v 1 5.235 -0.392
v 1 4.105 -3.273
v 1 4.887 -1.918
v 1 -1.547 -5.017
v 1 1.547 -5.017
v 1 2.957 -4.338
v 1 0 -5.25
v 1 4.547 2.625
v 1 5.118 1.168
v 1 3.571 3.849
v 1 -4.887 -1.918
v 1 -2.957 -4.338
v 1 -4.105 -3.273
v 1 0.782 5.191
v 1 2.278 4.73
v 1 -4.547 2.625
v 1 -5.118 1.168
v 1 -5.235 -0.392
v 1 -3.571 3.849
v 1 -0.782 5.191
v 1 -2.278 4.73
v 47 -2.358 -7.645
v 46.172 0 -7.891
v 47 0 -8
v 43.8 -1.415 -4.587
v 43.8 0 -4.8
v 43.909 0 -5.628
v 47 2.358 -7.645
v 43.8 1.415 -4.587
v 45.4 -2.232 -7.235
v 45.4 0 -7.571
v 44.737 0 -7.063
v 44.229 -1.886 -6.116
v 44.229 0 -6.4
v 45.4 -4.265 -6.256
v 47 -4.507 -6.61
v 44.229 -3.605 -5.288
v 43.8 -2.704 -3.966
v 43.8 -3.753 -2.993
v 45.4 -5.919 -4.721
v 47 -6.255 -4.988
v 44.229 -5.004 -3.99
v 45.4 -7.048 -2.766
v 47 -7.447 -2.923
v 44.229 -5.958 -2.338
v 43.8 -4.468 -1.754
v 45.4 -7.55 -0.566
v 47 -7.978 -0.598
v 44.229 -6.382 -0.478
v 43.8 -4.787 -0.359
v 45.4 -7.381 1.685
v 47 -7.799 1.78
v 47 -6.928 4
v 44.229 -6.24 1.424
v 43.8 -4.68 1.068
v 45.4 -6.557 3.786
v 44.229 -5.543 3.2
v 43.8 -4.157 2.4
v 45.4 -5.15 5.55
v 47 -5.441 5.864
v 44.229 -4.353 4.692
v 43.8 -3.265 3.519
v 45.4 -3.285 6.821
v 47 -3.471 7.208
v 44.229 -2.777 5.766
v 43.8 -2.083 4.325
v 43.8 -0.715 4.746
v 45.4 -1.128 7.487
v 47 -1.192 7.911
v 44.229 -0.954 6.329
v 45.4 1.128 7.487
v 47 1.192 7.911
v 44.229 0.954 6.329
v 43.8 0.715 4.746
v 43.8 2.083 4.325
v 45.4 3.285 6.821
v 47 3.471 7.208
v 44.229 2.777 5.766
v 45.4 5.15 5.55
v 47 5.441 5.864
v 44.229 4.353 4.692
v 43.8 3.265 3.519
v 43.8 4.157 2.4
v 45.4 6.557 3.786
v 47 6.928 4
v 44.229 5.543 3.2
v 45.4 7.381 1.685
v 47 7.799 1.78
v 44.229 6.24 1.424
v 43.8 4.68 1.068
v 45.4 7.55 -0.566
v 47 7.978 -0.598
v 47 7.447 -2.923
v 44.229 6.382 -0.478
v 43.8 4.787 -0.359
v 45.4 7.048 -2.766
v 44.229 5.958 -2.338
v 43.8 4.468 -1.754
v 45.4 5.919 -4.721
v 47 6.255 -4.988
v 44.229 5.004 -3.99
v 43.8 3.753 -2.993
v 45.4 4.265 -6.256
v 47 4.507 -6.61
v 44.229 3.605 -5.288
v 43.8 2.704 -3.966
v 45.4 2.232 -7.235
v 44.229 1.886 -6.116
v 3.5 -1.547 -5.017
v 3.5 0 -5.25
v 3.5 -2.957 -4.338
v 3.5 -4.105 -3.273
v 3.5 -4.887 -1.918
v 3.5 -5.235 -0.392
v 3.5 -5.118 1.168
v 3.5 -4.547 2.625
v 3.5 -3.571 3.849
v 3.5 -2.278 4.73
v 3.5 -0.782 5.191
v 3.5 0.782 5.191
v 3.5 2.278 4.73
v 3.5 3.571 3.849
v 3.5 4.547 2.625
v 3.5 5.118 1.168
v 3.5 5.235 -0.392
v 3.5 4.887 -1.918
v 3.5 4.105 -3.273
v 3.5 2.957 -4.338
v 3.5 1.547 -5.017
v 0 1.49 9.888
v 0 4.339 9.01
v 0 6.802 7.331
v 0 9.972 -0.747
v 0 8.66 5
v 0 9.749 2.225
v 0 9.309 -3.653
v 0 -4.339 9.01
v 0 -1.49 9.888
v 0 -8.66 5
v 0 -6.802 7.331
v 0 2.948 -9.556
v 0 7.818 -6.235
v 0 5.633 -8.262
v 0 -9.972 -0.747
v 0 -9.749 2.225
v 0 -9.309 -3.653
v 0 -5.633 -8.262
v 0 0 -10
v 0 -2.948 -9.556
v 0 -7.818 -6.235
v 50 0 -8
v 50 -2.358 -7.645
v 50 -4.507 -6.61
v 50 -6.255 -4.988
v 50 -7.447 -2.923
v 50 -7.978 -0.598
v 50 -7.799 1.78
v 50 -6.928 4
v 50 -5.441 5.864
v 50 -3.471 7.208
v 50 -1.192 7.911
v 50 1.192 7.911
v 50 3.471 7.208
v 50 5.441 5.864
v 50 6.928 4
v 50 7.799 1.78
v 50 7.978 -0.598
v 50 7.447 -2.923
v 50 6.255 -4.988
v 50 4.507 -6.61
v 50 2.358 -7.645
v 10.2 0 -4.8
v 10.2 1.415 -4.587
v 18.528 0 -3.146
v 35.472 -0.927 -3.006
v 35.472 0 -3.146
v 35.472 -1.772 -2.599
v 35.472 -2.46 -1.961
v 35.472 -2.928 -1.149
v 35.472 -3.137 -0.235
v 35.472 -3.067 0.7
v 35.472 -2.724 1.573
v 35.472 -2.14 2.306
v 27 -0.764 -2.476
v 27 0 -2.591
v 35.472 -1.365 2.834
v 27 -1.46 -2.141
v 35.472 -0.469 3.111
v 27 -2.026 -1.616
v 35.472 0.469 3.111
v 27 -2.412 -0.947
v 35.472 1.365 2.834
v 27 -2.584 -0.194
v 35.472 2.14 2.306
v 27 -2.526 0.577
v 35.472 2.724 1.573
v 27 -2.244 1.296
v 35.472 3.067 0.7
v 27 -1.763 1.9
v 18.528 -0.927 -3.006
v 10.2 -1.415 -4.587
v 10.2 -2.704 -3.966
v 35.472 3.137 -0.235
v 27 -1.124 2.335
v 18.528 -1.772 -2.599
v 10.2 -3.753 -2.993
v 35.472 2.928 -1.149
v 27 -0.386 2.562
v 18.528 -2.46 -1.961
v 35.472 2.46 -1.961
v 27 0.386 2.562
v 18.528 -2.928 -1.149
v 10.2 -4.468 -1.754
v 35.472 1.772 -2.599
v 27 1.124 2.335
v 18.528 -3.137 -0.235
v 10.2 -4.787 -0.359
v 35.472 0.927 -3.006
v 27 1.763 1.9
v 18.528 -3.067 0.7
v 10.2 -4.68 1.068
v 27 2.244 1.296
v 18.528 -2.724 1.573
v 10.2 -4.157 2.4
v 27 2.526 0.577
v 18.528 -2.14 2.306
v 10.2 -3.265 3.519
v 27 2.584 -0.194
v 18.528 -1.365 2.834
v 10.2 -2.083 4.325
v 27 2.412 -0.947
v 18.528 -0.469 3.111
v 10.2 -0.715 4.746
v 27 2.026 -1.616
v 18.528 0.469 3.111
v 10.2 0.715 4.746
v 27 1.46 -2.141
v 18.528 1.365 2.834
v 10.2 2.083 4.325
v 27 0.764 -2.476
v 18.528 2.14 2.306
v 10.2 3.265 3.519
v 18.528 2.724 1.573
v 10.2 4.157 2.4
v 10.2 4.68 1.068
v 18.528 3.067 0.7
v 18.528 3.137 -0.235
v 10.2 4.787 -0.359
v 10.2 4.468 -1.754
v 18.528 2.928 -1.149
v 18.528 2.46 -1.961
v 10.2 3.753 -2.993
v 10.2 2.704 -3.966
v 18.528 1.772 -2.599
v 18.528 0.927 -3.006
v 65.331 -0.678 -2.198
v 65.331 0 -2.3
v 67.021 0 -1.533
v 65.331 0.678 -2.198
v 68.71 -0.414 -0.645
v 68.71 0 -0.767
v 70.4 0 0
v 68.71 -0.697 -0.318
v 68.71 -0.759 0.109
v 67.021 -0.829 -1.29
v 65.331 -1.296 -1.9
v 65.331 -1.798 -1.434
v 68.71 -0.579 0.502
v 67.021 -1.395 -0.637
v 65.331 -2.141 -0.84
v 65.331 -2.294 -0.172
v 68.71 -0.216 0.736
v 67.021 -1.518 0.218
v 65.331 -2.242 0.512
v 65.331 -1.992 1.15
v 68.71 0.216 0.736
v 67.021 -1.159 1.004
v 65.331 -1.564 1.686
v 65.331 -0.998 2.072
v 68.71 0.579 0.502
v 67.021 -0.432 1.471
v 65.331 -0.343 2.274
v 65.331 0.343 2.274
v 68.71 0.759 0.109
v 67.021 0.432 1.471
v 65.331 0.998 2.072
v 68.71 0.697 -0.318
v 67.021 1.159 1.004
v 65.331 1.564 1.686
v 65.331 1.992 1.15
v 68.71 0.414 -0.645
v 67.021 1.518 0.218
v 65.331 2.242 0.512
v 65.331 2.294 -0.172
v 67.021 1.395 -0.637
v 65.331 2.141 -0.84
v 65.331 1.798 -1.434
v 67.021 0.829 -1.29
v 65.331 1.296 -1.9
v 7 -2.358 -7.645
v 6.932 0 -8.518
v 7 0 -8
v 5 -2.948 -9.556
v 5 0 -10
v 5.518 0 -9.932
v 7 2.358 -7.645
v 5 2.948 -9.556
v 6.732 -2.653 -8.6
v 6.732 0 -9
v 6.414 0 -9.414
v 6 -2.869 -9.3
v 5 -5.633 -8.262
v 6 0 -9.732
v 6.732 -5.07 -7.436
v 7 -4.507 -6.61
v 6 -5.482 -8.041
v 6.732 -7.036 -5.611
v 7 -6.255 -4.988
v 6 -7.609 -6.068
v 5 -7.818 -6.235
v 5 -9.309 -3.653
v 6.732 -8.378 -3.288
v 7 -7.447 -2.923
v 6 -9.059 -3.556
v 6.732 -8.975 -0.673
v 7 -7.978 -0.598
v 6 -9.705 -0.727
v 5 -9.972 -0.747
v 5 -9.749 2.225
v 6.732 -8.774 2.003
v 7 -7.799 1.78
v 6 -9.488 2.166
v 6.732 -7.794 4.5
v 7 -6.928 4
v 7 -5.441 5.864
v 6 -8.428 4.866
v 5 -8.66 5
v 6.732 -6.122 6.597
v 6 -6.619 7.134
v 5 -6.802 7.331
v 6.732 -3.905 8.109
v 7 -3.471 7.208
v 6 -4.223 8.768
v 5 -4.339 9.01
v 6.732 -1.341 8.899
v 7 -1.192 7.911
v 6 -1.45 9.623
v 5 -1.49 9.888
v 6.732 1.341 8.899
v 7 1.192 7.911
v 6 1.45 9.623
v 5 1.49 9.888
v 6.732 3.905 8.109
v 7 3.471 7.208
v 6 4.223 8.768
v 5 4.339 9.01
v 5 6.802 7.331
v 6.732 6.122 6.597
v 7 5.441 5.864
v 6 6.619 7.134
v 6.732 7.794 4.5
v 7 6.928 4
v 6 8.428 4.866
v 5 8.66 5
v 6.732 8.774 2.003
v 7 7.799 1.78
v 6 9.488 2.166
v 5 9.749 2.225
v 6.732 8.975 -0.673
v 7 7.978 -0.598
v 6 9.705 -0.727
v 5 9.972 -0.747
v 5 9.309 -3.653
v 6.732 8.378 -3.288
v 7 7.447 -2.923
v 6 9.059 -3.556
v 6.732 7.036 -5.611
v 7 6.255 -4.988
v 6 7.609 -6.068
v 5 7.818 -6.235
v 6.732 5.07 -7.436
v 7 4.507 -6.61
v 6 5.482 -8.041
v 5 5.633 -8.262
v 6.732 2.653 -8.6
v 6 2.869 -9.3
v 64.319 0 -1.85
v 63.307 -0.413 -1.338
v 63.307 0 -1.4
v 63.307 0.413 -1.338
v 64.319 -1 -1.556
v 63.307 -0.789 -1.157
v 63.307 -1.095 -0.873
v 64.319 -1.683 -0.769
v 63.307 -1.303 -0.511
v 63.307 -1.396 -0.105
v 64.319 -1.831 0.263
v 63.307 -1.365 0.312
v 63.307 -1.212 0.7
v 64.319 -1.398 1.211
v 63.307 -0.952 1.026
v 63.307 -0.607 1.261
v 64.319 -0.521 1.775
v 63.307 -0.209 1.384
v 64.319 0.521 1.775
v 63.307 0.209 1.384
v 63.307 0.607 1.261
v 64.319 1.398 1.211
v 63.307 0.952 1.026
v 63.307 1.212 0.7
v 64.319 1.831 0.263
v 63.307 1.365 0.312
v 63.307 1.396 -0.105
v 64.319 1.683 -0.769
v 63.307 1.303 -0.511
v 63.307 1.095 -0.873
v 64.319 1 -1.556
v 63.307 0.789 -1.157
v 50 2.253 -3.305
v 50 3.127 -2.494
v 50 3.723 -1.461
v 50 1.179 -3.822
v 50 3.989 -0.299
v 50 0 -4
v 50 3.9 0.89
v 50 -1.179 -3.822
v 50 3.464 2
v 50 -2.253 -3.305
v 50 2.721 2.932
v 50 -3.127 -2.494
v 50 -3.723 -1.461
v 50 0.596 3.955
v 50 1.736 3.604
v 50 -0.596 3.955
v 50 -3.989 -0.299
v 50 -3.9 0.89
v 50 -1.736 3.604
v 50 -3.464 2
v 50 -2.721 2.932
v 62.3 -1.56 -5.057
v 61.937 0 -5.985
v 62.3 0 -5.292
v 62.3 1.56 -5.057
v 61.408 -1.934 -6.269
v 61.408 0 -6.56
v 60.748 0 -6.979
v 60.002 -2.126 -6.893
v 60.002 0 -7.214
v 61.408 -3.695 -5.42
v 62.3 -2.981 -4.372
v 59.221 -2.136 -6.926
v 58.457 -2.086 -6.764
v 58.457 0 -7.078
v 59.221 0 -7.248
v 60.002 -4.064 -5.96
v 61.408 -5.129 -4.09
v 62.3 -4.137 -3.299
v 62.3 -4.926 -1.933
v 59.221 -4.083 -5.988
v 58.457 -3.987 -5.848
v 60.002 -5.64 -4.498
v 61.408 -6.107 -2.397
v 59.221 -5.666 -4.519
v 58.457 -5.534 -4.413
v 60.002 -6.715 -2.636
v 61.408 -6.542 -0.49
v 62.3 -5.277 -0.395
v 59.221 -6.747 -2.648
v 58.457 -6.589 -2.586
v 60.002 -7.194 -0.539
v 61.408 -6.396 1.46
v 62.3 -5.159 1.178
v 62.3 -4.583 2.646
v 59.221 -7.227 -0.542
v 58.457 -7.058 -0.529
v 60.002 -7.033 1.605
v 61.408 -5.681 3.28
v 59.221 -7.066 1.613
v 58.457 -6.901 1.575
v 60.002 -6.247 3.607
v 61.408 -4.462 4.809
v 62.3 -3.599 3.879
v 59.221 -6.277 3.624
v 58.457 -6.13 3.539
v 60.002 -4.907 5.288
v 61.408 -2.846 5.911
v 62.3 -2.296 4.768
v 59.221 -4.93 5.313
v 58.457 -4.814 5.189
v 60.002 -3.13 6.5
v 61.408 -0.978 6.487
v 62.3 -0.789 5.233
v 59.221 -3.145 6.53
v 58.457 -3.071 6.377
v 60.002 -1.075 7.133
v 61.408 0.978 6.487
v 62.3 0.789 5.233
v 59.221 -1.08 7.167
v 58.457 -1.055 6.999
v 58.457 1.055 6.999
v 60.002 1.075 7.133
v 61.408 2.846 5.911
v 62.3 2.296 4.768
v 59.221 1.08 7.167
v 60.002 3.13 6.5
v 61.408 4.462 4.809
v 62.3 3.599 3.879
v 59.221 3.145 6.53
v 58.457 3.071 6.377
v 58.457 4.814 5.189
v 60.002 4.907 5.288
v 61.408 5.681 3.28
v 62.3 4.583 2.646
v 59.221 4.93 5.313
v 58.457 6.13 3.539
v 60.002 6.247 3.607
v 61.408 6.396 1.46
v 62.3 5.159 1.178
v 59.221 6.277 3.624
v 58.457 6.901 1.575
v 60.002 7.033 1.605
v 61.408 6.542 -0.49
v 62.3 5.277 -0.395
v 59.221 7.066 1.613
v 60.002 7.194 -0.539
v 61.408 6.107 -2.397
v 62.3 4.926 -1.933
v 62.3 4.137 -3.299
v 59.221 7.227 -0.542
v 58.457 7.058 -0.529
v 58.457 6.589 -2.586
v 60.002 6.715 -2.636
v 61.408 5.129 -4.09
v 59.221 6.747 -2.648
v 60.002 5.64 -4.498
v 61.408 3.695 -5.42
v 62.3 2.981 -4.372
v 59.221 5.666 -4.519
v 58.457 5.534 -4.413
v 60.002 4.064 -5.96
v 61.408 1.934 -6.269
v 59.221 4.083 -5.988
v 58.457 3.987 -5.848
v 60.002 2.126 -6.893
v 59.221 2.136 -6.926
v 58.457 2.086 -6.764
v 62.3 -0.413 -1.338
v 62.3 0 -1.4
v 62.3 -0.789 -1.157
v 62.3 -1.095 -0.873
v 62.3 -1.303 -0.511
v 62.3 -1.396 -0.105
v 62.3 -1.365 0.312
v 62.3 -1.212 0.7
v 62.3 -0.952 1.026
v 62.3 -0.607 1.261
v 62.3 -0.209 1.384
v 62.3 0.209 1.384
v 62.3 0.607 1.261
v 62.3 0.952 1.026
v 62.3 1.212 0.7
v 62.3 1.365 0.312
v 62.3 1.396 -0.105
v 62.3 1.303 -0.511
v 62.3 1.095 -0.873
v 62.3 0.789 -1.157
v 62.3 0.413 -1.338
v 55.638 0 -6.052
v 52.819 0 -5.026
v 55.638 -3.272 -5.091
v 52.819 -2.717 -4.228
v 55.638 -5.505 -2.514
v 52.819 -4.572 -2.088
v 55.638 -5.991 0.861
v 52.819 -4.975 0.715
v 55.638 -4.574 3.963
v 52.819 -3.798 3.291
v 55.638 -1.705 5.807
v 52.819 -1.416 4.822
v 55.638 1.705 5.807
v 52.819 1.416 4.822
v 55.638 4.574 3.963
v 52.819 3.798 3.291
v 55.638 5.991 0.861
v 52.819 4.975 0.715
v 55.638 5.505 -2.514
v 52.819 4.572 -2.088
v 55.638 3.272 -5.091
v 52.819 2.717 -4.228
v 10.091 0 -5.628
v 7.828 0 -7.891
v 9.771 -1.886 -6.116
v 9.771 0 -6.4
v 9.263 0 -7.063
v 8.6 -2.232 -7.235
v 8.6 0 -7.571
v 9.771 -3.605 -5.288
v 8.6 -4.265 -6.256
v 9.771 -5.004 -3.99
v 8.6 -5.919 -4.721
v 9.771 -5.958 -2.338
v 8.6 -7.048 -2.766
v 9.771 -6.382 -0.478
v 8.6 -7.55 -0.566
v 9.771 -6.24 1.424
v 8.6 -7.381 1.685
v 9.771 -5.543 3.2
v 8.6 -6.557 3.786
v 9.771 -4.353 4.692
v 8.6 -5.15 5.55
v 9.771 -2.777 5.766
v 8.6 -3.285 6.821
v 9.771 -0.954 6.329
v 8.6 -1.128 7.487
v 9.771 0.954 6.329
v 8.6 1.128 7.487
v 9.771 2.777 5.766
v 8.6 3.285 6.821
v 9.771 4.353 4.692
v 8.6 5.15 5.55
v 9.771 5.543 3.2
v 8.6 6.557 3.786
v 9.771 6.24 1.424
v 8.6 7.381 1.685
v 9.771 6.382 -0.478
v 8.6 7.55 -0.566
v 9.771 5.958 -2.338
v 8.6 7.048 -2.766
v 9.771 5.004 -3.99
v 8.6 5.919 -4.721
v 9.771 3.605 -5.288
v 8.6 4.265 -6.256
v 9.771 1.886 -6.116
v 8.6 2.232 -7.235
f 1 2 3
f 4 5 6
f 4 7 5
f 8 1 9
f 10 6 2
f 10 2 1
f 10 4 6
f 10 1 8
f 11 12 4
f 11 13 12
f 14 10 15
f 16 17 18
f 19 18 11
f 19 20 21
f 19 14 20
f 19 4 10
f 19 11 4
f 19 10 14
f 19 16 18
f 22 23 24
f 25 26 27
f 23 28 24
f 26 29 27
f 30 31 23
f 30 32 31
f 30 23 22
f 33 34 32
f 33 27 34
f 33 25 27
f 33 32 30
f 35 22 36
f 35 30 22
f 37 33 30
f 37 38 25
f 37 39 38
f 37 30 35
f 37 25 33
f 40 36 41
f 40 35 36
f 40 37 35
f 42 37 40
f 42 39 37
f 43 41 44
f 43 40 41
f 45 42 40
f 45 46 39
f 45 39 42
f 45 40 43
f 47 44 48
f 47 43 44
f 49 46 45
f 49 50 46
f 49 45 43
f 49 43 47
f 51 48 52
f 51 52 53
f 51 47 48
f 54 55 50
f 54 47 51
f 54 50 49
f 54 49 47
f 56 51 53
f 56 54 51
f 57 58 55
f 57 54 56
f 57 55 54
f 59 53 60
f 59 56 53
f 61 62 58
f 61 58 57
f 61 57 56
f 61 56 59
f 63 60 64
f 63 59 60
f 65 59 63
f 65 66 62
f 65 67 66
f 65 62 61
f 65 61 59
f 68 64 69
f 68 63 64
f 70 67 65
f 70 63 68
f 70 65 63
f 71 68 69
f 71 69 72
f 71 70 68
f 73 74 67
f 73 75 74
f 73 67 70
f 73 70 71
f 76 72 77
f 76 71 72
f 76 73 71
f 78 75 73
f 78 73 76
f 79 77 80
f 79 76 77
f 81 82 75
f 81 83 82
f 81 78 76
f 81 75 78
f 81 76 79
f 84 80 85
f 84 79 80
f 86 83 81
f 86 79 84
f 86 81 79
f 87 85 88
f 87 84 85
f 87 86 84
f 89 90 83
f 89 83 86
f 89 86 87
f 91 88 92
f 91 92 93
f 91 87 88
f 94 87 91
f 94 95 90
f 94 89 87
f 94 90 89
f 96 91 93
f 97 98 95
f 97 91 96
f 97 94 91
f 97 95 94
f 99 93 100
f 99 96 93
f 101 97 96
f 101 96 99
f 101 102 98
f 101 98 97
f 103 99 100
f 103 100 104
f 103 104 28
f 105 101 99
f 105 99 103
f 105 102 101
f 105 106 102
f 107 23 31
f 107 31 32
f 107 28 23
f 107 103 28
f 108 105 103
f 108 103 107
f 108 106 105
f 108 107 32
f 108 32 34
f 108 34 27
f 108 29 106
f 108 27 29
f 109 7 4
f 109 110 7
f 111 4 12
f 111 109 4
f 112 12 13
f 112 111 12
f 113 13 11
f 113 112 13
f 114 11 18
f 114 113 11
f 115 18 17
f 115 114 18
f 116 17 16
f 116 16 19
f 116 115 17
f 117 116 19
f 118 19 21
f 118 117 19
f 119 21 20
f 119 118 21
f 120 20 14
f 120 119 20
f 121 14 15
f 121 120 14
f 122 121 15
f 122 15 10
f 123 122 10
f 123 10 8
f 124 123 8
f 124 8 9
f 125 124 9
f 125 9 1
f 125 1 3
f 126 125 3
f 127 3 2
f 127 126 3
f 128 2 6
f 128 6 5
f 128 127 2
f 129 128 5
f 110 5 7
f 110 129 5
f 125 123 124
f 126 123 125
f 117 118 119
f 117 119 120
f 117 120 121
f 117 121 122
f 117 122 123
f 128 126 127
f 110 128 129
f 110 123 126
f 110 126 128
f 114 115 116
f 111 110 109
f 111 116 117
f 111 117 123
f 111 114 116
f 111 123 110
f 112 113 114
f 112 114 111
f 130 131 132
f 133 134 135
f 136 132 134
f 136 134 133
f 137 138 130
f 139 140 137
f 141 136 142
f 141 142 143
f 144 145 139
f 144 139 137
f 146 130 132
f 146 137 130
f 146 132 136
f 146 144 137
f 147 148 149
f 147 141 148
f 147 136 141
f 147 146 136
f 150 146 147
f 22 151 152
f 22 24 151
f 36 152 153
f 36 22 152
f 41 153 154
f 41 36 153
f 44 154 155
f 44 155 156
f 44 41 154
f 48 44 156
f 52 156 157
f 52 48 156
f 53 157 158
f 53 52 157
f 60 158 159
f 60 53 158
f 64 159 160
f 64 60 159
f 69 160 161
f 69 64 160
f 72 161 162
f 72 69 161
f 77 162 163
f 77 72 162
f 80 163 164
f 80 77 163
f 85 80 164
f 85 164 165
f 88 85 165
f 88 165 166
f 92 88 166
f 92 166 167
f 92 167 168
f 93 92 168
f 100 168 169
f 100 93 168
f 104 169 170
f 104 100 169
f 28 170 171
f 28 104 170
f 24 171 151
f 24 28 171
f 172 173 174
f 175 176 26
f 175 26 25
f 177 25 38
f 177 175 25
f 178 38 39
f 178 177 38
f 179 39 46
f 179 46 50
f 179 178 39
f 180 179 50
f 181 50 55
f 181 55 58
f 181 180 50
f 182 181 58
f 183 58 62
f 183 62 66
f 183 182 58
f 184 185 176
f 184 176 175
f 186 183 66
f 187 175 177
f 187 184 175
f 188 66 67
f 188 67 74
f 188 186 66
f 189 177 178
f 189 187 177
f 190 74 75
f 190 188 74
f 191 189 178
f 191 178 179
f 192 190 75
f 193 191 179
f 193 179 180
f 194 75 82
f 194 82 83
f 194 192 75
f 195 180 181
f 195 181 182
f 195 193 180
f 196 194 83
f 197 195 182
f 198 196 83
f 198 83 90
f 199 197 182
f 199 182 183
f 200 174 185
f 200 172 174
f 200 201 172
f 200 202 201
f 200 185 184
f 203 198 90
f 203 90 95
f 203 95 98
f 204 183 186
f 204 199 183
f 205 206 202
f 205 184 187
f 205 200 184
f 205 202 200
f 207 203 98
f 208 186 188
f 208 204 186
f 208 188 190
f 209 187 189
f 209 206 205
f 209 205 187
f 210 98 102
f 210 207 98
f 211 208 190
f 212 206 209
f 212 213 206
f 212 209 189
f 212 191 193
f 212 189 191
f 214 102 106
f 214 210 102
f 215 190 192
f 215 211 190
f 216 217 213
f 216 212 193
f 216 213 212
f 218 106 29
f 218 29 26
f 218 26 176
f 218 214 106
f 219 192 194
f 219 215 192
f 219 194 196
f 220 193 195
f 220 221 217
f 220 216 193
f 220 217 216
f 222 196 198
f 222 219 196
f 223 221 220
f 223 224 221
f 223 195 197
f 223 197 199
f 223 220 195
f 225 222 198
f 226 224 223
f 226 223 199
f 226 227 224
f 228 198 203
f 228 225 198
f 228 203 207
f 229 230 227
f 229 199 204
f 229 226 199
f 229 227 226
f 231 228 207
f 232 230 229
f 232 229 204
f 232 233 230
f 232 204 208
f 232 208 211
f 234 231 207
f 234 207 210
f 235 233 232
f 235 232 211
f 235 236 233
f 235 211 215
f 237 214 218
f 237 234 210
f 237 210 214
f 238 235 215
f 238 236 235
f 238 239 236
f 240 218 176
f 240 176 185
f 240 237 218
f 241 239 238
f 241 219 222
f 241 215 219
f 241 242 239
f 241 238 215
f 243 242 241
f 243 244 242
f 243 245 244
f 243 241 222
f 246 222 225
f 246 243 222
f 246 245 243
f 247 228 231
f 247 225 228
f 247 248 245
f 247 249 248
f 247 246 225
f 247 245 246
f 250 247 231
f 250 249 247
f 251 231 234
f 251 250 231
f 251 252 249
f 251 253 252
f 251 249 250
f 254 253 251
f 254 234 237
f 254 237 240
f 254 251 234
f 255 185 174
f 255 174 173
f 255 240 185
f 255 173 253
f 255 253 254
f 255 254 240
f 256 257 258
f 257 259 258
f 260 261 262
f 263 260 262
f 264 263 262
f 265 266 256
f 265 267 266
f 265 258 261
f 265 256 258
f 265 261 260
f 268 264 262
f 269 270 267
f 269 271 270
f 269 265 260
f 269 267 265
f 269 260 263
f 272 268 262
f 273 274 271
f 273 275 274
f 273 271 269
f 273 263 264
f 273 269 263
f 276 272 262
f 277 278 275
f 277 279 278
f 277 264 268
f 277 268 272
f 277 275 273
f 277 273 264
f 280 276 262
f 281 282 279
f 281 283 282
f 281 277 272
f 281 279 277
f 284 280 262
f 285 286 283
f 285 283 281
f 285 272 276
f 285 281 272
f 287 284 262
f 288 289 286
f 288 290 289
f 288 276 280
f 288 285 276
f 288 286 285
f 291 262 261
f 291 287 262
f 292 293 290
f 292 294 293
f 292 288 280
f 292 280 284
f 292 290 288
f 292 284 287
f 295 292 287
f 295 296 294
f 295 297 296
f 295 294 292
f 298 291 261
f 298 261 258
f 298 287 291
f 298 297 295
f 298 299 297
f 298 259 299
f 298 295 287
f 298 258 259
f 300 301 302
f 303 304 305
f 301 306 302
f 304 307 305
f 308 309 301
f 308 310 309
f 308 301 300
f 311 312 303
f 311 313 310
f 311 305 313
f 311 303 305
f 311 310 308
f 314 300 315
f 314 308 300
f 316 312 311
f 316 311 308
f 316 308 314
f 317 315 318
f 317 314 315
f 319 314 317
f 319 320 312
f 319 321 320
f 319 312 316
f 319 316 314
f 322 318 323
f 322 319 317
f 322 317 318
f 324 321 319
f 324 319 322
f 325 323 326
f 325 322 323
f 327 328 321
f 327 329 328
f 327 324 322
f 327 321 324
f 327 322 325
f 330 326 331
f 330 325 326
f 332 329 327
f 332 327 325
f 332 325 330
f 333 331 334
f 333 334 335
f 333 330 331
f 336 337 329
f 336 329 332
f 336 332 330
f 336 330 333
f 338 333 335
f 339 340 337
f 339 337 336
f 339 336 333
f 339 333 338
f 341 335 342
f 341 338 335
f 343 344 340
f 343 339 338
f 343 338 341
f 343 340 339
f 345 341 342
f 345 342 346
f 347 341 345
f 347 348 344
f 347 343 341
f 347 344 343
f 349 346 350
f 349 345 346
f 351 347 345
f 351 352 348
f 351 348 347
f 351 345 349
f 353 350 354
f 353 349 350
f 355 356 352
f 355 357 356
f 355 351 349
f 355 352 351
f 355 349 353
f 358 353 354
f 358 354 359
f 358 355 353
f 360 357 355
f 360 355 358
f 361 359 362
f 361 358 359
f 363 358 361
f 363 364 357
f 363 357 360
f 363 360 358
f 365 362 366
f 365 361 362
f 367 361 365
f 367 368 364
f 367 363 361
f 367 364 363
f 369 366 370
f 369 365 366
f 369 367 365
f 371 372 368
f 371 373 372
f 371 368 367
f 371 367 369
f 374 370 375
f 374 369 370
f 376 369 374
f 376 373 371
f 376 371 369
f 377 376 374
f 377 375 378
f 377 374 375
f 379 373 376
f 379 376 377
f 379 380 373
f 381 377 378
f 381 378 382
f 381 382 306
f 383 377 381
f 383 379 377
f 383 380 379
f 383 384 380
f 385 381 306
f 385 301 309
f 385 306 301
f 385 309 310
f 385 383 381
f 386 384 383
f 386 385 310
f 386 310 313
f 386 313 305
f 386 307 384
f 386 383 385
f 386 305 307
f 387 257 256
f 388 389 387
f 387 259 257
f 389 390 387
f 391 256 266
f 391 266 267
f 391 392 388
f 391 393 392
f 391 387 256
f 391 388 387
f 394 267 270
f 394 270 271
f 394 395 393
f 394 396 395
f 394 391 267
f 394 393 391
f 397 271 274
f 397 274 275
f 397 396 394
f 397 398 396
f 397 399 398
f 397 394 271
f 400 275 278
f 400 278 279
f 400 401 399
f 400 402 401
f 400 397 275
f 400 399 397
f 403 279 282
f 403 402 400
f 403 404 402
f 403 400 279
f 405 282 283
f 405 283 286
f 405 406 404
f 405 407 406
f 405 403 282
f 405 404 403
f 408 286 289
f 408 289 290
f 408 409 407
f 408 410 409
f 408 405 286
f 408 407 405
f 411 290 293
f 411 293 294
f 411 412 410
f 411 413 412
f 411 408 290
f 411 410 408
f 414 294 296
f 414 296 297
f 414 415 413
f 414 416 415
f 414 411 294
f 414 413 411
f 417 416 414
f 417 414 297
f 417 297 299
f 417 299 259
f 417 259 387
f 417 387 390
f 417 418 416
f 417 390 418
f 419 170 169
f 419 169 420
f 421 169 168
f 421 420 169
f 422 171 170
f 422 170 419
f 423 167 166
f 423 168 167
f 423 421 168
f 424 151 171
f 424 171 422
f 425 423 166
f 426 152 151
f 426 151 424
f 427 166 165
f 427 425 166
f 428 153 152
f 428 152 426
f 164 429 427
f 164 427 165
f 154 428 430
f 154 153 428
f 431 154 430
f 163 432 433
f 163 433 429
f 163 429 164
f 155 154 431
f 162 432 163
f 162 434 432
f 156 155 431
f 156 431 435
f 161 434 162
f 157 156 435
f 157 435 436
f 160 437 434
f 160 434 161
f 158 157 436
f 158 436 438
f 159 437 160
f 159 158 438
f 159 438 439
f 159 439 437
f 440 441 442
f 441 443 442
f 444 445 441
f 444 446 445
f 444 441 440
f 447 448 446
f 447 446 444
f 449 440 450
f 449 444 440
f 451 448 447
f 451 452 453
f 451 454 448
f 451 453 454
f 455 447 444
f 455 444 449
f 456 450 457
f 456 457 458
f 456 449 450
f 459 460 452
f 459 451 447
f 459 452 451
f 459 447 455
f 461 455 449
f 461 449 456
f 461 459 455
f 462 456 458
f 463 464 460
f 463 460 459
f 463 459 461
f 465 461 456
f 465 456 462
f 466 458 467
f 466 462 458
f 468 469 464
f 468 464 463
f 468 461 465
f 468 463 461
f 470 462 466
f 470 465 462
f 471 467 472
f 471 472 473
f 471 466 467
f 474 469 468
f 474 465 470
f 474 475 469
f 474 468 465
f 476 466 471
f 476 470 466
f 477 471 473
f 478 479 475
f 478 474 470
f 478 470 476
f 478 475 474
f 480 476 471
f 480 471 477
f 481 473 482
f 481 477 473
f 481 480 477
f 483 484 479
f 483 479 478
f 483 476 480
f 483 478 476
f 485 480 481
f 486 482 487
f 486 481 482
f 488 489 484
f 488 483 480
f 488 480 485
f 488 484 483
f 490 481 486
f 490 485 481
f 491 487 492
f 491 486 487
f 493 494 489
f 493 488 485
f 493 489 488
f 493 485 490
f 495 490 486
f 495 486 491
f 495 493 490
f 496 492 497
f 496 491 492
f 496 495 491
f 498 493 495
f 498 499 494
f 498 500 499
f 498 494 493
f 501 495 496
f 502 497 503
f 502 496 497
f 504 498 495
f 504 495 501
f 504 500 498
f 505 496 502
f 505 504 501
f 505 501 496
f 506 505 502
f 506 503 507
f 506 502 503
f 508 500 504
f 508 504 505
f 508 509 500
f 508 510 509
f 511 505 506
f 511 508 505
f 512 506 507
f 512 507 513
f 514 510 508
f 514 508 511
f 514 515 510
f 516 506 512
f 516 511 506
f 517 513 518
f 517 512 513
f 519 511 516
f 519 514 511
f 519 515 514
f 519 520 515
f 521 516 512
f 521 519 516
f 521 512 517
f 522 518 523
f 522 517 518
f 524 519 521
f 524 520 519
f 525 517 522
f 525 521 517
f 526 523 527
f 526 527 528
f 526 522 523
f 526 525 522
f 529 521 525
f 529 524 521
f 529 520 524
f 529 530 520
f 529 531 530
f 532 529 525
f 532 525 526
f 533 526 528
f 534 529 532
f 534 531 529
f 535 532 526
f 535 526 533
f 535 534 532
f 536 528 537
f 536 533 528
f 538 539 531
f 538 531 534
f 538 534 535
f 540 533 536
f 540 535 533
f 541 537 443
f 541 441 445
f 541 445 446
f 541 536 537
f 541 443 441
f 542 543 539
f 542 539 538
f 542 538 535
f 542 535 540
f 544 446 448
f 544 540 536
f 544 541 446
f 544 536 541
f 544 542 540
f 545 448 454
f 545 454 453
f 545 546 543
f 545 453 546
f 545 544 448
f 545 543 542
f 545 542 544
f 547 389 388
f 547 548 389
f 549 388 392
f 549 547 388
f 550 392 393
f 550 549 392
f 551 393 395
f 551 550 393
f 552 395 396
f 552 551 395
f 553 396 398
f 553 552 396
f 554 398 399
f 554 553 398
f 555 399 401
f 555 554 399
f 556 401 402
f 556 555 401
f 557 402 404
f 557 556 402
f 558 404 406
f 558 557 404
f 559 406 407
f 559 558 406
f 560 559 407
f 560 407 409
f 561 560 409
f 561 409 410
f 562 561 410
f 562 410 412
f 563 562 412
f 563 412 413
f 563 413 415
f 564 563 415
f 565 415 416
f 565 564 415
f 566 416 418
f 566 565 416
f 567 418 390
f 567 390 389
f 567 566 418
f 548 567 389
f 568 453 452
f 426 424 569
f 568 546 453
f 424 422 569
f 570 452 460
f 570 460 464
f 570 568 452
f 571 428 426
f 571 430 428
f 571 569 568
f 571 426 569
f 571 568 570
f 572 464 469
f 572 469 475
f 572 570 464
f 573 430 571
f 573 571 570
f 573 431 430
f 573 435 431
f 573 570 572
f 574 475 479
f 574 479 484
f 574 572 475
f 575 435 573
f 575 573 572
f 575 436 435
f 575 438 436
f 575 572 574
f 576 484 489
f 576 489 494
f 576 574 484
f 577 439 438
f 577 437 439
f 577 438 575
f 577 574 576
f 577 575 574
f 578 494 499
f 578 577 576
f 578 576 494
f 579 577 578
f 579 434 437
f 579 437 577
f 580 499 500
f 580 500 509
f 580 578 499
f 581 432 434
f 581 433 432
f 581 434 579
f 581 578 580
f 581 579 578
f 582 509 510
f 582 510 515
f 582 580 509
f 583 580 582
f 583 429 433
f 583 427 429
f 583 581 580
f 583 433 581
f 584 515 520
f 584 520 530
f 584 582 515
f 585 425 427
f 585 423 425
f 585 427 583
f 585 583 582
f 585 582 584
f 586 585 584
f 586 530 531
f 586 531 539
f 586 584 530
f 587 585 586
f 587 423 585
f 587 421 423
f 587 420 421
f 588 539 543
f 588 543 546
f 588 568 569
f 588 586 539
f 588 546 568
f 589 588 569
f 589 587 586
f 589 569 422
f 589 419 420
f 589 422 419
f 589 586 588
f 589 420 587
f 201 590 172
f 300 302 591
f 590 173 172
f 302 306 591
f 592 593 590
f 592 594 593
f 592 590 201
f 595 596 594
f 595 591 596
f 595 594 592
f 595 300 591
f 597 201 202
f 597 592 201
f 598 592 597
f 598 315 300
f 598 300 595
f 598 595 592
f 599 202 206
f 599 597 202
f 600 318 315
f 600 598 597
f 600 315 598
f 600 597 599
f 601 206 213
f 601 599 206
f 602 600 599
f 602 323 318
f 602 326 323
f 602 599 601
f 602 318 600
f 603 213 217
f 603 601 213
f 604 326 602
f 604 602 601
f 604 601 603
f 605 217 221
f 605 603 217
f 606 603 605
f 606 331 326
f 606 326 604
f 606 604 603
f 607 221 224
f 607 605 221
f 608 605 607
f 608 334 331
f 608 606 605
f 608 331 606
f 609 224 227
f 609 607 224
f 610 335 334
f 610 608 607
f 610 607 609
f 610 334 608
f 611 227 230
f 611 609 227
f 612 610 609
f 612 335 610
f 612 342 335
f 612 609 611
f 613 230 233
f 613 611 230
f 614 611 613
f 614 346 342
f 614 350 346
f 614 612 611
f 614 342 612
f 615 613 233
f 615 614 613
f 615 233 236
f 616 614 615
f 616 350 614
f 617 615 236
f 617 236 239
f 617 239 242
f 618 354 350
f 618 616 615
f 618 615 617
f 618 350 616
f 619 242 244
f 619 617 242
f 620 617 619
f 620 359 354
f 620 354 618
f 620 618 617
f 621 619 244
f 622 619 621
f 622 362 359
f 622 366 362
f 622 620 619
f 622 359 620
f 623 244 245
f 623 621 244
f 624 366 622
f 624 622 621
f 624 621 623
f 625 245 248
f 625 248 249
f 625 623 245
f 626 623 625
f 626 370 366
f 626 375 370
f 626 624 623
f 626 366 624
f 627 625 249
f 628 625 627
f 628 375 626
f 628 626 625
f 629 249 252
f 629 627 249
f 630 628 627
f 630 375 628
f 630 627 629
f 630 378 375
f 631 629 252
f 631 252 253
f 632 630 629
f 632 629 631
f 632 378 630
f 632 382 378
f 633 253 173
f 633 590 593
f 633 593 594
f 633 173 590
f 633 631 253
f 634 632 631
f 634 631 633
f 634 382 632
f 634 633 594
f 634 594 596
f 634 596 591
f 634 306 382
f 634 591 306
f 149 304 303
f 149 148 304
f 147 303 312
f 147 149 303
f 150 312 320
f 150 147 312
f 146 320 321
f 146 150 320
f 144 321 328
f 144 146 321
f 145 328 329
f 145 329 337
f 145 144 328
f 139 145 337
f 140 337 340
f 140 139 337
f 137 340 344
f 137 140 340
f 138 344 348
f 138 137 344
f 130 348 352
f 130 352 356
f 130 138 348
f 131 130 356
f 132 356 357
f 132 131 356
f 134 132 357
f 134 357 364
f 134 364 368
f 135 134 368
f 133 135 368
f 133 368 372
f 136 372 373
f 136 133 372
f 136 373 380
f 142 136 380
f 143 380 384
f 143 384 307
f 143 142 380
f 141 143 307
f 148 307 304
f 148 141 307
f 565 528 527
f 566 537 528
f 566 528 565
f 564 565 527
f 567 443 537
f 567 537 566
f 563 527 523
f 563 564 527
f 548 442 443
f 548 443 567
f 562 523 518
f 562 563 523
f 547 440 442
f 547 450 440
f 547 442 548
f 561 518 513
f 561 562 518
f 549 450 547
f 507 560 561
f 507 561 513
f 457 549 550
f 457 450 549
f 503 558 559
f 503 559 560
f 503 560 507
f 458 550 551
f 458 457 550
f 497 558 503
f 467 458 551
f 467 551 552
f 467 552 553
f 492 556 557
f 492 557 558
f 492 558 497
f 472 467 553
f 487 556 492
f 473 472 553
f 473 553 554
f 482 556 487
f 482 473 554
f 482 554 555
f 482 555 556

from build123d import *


with BuildPart() as part:
    # Sketch 153 → Повернуть1 (revolve)
    with BuildSketch(Plane(origin=(0, 0, 0), x_dir=(1, 0, 0), z_dir=(0, 1, 0))):
        Polygon((0, 10), (0, 0), (1, 0), (1, 5.25), (3.5, 5.25), (3.5, 0), (5, 0), (5, 10), align=None)
        with BuildLine():
            ThreePointArc((7, 8), (6.414213562, 9.414213562), (5, 10))
            Line((5, 10), (5, 0))
            Line((5, 0), (7, 0))
            Line((7, 0), (7, 8))
        make_face()
        with BuildLine():
            ThreePointArc((10.2, 4.8), (9.2627417, 7.0627417), (7, 8))
            Line((7, 8), (7, 0))
            Line((7, 0), (10.2, 0))
            Line((10.2, 0), (10.2, 4.8))
        make_face()
    revolve(axis=Axis((5, 0, 0), (-1, 0, 0)))

    # Sketch 880 → Повернуть2 (revolve)
    with BuildSketch(Plane(origin=(0, 0, 0), x_dir=(1, 0, 0), z_dir=(0, 1, 0))):
        with BuildLine():
            Line((10.2, 4.8), (10.2, 0))
            Line((10.2, 0), (70.4, 0))
            Line((70.4, 0), (65.331156927, 2.3))
            Line((65.331156927, 2.3), (63.30687842, 1.4))
            Line((63.30687842, 1.4), (62.3, 1.4))
            Line((62.3, 1.4), (62.3, 5.291657255))
            ThreePointArc((62.3, 5.291657255), (60.748015293, 6.979485771), (58.457233587, 7.07818129))
            Line((58.457233587, 7.07818129), (50, 4))
            Line((50, 4), (50, 8))
            Line((50, 8), (47, 8))
            ThreePointArc((47, 8), (44.7372583, 7.0627417), (43.8, 4.8))
            ThreePointArc((43.8, 4.8), (27, 2.591400685), (10.2, 4.8))
        make_face()
    revolve(axis=Axis((50, 0, 0), (-1, 0, 0)))


solid = part.part
